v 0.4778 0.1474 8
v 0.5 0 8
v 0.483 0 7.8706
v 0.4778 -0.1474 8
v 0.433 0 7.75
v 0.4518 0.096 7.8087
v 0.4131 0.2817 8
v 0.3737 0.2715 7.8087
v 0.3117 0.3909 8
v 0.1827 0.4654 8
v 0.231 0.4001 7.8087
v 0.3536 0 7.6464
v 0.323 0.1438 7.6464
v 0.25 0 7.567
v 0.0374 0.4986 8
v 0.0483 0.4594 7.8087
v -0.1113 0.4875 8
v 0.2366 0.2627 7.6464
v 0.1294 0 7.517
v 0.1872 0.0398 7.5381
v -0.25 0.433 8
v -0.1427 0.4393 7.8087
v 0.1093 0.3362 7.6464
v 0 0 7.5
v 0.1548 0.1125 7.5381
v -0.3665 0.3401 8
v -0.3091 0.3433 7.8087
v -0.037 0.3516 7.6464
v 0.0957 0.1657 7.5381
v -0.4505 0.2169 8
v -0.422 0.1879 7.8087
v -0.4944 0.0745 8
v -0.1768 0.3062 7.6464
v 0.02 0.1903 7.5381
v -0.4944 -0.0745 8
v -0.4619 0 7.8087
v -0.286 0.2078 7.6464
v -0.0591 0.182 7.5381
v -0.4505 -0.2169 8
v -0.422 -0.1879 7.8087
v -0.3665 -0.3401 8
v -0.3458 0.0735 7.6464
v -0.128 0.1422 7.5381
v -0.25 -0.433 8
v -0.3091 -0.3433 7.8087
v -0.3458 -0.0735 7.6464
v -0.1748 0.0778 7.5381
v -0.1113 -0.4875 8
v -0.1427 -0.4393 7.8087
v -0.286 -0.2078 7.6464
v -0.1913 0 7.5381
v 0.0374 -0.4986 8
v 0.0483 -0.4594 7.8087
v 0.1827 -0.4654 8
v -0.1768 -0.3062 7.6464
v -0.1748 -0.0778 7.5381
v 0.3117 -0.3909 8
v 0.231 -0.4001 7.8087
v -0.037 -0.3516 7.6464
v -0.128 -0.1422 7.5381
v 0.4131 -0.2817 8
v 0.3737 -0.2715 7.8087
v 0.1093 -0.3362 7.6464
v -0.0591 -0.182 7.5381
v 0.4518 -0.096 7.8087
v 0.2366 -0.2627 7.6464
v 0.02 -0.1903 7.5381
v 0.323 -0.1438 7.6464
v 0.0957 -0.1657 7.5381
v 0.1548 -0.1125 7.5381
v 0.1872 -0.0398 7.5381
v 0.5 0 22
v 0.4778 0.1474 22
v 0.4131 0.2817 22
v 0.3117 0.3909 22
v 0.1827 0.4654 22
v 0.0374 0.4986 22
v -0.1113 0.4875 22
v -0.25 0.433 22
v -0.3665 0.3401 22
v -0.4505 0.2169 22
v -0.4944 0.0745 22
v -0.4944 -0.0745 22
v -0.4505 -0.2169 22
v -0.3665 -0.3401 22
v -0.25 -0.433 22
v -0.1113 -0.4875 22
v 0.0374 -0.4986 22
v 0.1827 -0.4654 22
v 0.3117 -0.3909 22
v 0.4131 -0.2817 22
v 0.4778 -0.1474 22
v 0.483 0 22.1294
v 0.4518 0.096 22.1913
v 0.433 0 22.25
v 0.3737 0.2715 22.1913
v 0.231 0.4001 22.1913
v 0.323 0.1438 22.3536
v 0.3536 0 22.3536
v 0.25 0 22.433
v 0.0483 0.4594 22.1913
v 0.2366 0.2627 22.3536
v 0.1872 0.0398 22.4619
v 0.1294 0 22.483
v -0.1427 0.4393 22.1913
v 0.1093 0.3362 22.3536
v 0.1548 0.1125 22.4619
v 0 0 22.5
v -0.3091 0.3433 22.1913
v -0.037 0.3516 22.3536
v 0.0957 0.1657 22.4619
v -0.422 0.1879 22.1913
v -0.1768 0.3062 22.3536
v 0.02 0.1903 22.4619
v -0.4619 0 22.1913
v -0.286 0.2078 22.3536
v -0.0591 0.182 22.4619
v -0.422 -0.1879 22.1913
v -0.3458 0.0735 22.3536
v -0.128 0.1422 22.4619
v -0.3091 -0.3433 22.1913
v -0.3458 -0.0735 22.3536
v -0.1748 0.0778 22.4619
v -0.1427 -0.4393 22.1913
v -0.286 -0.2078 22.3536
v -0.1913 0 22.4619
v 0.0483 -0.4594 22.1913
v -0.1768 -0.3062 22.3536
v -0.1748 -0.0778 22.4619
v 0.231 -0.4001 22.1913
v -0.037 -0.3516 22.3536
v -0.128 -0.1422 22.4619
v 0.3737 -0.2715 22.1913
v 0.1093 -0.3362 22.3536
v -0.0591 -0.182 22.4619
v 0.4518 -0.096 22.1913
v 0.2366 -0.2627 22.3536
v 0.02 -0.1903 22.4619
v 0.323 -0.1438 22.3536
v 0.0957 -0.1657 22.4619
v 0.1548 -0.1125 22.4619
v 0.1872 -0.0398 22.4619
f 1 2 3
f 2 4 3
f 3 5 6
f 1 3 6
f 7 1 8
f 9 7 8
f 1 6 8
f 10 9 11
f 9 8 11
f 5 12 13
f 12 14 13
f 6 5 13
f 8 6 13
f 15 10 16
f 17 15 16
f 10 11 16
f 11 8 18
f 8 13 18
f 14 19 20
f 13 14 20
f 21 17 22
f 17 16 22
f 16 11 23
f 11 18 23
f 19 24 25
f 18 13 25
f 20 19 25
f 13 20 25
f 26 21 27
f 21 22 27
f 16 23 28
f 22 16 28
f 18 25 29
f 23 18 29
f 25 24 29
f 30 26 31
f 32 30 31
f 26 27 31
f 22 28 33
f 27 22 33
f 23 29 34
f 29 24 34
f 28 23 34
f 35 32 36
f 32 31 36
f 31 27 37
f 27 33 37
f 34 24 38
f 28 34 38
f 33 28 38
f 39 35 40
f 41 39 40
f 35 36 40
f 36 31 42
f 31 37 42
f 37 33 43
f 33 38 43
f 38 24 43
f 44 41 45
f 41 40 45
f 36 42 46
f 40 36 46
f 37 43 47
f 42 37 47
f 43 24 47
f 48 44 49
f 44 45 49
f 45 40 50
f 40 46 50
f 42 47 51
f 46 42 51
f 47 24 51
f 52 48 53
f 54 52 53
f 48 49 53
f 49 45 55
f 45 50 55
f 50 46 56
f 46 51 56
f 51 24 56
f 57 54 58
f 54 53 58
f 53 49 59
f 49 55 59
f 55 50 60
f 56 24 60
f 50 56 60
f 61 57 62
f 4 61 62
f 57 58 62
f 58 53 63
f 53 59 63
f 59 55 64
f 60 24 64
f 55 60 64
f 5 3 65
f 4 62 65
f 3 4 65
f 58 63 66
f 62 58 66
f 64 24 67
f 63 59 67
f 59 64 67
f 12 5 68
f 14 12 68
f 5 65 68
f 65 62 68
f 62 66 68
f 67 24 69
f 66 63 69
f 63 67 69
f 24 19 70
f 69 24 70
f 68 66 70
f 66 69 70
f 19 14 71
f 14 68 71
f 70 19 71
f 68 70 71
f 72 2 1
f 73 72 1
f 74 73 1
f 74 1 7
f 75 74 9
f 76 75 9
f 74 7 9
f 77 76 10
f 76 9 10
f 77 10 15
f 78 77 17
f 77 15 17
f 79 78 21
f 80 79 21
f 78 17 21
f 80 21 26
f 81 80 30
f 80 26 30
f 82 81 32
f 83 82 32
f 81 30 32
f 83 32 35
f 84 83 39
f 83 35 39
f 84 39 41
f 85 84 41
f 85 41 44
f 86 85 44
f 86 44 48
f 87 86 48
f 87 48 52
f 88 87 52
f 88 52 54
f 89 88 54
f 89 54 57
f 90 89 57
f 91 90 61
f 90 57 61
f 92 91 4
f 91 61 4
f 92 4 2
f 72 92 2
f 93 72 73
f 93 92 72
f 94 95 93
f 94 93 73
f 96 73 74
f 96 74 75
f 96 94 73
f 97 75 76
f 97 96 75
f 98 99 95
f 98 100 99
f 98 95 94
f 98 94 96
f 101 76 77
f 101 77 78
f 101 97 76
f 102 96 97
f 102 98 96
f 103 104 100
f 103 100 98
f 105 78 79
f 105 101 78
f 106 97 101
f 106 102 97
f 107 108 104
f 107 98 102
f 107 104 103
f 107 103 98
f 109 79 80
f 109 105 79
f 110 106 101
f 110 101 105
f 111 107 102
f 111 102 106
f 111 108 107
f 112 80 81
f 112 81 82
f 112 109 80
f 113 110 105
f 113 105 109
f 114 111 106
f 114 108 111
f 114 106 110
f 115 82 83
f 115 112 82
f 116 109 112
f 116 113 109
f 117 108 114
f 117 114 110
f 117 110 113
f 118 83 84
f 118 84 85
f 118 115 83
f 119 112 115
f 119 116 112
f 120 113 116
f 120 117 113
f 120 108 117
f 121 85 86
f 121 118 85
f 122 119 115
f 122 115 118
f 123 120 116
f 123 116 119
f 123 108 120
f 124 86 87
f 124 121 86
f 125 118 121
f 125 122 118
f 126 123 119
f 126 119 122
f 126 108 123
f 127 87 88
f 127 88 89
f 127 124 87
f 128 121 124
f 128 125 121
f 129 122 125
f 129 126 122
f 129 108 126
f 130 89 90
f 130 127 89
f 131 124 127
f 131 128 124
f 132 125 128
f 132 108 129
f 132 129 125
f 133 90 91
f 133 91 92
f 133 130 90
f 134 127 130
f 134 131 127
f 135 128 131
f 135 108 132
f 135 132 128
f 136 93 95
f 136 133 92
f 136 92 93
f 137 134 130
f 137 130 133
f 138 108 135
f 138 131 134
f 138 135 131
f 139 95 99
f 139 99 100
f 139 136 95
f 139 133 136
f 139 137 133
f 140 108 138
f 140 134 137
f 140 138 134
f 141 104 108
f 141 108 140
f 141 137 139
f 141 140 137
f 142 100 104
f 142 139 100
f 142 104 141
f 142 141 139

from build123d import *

# Parameters (mm, degrees)
SKETCH2_R           = 1
BOSS_EXTRUDE4_DEPTH = 30
FILLET2_R           = 1
ESCALA1_SCALE       = 0.5


with BuildPart() as part:
    # Sketch2 → Boss-Extrude4 (new body)
    with BuildSketch(Plane.XY):
        Circle(SKETCH2_R)
    extrude(amount=BOSS_EXTRUDE4_DEPTH)

    # Fillet2
    fillet2_edges = [part.edges().sort_by_distance(p)[0] for p in [
        (-1, 0, 0),
        (-1, 0, 30),
    ]]
    fillet(fillet2_edges, radius=FILLET2_R)


with BuildPart() as part_1:
    # Escala1: scaled about (0, 0, 15)
    add(part.part.scale(ESCALA1_SCALE).moved(Location((0, 0, 7.5))))


solid = part_1.part
